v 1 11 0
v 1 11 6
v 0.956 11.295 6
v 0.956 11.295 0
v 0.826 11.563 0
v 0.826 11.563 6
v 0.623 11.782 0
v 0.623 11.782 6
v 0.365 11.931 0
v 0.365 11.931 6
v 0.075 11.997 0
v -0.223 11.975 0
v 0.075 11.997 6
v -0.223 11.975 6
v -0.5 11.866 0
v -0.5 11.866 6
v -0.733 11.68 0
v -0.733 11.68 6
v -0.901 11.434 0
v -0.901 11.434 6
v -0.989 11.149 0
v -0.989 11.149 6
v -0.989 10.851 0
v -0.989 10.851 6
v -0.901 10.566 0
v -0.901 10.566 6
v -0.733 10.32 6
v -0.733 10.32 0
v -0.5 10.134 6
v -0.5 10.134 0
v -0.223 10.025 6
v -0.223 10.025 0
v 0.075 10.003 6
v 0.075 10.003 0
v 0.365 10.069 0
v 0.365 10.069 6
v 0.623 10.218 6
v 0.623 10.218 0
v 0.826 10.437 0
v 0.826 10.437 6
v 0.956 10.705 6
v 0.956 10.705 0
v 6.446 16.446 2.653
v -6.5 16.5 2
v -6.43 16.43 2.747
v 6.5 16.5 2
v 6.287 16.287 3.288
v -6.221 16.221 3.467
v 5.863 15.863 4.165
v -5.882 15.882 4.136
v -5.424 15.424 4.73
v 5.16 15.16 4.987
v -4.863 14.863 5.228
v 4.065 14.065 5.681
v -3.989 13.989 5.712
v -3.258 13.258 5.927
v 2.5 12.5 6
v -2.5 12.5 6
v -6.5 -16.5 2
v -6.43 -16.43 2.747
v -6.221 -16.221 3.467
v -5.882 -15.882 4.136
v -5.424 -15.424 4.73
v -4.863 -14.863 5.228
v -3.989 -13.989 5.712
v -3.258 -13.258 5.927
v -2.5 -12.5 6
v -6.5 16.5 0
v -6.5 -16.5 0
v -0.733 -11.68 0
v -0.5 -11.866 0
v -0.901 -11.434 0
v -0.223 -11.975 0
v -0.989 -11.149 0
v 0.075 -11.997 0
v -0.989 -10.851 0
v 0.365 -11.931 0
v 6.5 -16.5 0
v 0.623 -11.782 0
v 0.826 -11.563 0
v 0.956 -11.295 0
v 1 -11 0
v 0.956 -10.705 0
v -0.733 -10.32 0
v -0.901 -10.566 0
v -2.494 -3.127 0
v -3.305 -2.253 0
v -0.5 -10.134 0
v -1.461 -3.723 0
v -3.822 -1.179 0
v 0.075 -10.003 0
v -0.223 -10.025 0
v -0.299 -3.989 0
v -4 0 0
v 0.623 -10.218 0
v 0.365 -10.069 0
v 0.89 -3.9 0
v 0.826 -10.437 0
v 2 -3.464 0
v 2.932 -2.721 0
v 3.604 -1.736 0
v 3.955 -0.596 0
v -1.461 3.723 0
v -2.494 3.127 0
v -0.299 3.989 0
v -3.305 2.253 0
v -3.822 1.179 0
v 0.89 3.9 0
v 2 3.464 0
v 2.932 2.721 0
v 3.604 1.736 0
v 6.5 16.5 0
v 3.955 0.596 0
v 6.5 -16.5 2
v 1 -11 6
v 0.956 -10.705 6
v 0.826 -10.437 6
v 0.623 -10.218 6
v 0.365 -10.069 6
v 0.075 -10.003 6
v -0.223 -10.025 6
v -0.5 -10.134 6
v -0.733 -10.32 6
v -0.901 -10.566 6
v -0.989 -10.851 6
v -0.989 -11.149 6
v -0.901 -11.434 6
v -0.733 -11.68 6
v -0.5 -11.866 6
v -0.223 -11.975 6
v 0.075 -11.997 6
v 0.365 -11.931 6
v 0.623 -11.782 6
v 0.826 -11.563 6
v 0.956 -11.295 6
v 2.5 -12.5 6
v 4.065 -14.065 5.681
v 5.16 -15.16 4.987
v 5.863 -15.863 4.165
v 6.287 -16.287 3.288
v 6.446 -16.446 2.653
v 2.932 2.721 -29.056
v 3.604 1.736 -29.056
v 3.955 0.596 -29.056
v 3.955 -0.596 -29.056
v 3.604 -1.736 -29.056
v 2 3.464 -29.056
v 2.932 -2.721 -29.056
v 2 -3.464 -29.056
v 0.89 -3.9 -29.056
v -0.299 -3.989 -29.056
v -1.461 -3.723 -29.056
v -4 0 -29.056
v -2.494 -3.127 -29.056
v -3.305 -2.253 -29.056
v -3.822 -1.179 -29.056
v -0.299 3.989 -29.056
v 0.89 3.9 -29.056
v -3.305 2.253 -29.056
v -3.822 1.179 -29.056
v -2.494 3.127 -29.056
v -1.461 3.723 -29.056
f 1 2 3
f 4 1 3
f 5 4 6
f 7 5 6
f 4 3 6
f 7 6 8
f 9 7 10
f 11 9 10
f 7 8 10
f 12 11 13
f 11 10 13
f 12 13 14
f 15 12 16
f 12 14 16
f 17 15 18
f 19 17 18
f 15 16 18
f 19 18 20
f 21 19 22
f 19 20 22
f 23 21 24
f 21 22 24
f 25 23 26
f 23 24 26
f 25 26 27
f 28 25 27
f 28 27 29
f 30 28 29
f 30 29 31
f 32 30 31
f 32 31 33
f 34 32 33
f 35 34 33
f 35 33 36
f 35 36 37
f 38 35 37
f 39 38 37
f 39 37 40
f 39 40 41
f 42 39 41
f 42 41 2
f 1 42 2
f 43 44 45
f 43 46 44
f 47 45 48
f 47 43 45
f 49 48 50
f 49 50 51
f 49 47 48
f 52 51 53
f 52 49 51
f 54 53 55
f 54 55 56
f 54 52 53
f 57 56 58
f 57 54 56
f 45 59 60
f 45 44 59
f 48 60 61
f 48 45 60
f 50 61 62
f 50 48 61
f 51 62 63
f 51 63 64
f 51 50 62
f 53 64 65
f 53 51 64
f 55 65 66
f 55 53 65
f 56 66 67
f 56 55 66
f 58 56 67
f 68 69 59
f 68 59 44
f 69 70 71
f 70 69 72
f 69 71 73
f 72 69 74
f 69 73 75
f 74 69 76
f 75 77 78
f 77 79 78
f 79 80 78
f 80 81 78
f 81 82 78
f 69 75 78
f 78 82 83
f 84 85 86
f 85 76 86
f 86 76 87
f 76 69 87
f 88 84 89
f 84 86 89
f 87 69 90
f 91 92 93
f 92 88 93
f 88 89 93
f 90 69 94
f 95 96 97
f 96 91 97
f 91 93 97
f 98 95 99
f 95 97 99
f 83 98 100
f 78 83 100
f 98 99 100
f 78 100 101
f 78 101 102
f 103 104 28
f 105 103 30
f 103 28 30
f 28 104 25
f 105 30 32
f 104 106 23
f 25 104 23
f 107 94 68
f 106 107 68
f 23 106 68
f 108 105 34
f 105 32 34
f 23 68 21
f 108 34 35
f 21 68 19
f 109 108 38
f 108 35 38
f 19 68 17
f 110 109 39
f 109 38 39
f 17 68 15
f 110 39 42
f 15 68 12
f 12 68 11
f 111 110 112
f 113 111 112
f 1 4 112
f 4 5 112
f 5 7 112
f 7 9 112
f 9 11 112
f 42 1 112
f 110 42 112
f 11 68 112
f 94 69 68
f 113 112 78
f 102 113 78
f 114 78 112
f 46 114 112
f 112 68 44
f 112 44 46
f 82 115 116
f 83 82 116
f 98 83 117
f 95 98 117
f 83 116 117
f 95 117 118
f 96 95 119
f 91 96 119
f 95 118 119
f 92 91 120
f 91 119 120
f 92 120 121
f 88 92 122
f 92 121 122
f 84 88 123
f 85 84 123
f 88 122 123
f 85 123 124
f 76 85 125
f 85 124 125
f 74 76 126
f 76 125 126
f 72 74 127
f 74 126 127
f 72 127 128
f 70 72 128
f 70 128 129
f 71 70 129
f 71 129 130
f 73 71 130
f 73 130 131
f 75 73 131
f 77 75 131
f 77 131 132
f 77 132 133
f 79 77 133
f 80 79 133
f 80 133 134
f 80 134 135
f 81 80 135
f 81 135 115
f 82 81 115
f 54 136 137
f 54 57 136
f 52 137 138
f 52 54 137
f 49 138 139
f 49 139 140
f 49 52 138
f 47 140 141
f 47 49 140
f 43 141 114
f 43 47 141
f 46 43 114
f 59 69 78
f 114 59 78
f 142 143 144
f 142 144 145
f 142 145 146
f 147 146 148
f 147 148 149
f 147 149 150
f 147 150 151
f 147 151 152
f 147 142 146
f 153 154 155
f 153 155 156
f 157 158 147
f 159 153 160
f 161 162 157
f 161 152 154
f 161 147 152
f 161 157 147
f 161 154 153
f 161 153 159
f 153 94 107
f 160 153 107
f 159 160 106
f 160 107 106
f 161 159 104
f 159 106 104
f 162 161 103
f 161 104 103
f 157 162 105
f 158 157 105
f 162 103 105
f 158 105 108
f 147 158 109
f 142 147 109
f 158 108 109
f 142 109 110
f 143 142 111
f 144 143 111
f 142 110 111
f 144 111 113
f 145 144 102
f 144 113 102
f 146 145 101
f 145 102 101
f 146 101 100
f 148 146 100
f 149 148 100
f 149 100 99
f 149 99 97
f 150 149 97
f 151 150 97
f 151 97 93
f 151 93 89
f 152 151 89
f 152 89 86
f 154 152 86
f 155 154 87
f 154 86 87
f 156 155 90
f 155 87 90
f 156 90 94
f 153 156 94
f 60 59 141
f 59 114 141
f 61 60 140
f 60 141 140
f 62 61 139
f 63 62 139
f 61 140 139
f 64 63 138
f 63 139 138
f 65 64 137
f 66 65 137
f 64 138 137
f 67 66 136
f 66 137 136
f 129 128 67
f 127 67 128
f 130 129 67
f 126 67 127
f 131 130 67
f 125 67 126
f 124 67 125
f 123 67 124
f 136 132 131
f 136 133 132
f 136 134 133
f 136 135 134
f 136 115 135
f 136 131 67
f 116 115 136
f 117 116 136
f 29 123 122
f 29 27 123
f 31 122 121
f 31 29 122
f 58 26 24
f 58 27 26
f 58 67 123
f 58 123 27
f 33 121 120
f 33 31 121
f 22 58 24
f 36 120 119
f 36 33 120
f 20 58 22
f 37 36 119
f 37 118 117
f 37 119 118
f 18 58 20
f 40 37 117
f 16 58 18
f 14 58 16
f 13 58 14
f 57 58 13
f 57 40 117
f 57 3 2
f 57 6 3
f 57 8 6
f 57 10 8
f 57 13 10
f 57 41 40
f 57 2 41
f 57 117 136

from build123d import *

# Parameters (mm, degrees)
SKETCH1_W           = 13
SKETCH1_H           = 33
BOSS_EXTRUDE1_DEPTH = 6
SKETCH2_R           = 4
BOSS_EXTRUDE2_DEPTH = 29.05598176
CUT_EXTRUDE1_REACH  = 41.286
SKETCH3_R           = 1
FILLET1_R           = 4


with BuildPart() as part:
    # Sketch1 → Boss-Extrude1 (new body)
    with BuildSketch(Plane.XY):
        Rectangle(SKETCH1_W, SKETCH1_H)
    extrude(amount=BOSS_EXTRUDE1_DEPTH)

    # Sketch2 → Boss-Extrude2 (add)
    with BuildSketch(Plane(origin=(0, 0, 0), x_dir=(-1, 0, 0), z_dir=(0, 0, -1))):
        Circle(SKETCH2_R)
    extrude(amount=BOSS_EXTRUDE2_DEPTH)

    # Sketch3 → Cut-Extrude1 (cut, up to next)
    with BuildSketch(Plane.XY.offset(6), mode=Mode.PRIVATE) as cut_extrude1_sk1:
        with Locations((0, 11)):
            Circle(SKETCH3_R)
    cut_extrude1_tool1 = extrude(cut_extrude1_sk1.sketch, amount=-CUT_EXTRUDE1_REACH, mode=Mode.PRIVATE) & part.part
    # Sketch3 → Cut-Extrude1 (cut, up to next)
    with BuildSketch(Plane.XY.offset(6), mode=Mode.PRIVATE) as cut_extrude1_sk2:
        with Locations((0, -11)):
            Circle(SKETCH3_R)
    cut_extrude1_tool2 = extrude(cut_extrude1_sk2.sketch, amount=-CUT_EXTRUDE1_REACH, mode=Mode.PRIVATE) & part.part
    add(cut_extrude1_tool1.solids().sort_by_distance((0, 11, 6))[0], mode=Mode.SUBTRACT)
    add(cut_extrude1_tool2.solids().sort_by_distance((0, -11, 6))[0], mode=Mode.SUBTRACT)

    # Fillet1
    fillet1_edges = [part.edges().sort_by_distance(p)[0] for p in [
        (6.5, 0, 6),
        (0, 16.5, 6),
        (-6.5, 0, 6),
        (0, -16.5, 6),
    ]]
    fillet(fillet1_edges, radius=FILLET1_R)


solid = part.part
